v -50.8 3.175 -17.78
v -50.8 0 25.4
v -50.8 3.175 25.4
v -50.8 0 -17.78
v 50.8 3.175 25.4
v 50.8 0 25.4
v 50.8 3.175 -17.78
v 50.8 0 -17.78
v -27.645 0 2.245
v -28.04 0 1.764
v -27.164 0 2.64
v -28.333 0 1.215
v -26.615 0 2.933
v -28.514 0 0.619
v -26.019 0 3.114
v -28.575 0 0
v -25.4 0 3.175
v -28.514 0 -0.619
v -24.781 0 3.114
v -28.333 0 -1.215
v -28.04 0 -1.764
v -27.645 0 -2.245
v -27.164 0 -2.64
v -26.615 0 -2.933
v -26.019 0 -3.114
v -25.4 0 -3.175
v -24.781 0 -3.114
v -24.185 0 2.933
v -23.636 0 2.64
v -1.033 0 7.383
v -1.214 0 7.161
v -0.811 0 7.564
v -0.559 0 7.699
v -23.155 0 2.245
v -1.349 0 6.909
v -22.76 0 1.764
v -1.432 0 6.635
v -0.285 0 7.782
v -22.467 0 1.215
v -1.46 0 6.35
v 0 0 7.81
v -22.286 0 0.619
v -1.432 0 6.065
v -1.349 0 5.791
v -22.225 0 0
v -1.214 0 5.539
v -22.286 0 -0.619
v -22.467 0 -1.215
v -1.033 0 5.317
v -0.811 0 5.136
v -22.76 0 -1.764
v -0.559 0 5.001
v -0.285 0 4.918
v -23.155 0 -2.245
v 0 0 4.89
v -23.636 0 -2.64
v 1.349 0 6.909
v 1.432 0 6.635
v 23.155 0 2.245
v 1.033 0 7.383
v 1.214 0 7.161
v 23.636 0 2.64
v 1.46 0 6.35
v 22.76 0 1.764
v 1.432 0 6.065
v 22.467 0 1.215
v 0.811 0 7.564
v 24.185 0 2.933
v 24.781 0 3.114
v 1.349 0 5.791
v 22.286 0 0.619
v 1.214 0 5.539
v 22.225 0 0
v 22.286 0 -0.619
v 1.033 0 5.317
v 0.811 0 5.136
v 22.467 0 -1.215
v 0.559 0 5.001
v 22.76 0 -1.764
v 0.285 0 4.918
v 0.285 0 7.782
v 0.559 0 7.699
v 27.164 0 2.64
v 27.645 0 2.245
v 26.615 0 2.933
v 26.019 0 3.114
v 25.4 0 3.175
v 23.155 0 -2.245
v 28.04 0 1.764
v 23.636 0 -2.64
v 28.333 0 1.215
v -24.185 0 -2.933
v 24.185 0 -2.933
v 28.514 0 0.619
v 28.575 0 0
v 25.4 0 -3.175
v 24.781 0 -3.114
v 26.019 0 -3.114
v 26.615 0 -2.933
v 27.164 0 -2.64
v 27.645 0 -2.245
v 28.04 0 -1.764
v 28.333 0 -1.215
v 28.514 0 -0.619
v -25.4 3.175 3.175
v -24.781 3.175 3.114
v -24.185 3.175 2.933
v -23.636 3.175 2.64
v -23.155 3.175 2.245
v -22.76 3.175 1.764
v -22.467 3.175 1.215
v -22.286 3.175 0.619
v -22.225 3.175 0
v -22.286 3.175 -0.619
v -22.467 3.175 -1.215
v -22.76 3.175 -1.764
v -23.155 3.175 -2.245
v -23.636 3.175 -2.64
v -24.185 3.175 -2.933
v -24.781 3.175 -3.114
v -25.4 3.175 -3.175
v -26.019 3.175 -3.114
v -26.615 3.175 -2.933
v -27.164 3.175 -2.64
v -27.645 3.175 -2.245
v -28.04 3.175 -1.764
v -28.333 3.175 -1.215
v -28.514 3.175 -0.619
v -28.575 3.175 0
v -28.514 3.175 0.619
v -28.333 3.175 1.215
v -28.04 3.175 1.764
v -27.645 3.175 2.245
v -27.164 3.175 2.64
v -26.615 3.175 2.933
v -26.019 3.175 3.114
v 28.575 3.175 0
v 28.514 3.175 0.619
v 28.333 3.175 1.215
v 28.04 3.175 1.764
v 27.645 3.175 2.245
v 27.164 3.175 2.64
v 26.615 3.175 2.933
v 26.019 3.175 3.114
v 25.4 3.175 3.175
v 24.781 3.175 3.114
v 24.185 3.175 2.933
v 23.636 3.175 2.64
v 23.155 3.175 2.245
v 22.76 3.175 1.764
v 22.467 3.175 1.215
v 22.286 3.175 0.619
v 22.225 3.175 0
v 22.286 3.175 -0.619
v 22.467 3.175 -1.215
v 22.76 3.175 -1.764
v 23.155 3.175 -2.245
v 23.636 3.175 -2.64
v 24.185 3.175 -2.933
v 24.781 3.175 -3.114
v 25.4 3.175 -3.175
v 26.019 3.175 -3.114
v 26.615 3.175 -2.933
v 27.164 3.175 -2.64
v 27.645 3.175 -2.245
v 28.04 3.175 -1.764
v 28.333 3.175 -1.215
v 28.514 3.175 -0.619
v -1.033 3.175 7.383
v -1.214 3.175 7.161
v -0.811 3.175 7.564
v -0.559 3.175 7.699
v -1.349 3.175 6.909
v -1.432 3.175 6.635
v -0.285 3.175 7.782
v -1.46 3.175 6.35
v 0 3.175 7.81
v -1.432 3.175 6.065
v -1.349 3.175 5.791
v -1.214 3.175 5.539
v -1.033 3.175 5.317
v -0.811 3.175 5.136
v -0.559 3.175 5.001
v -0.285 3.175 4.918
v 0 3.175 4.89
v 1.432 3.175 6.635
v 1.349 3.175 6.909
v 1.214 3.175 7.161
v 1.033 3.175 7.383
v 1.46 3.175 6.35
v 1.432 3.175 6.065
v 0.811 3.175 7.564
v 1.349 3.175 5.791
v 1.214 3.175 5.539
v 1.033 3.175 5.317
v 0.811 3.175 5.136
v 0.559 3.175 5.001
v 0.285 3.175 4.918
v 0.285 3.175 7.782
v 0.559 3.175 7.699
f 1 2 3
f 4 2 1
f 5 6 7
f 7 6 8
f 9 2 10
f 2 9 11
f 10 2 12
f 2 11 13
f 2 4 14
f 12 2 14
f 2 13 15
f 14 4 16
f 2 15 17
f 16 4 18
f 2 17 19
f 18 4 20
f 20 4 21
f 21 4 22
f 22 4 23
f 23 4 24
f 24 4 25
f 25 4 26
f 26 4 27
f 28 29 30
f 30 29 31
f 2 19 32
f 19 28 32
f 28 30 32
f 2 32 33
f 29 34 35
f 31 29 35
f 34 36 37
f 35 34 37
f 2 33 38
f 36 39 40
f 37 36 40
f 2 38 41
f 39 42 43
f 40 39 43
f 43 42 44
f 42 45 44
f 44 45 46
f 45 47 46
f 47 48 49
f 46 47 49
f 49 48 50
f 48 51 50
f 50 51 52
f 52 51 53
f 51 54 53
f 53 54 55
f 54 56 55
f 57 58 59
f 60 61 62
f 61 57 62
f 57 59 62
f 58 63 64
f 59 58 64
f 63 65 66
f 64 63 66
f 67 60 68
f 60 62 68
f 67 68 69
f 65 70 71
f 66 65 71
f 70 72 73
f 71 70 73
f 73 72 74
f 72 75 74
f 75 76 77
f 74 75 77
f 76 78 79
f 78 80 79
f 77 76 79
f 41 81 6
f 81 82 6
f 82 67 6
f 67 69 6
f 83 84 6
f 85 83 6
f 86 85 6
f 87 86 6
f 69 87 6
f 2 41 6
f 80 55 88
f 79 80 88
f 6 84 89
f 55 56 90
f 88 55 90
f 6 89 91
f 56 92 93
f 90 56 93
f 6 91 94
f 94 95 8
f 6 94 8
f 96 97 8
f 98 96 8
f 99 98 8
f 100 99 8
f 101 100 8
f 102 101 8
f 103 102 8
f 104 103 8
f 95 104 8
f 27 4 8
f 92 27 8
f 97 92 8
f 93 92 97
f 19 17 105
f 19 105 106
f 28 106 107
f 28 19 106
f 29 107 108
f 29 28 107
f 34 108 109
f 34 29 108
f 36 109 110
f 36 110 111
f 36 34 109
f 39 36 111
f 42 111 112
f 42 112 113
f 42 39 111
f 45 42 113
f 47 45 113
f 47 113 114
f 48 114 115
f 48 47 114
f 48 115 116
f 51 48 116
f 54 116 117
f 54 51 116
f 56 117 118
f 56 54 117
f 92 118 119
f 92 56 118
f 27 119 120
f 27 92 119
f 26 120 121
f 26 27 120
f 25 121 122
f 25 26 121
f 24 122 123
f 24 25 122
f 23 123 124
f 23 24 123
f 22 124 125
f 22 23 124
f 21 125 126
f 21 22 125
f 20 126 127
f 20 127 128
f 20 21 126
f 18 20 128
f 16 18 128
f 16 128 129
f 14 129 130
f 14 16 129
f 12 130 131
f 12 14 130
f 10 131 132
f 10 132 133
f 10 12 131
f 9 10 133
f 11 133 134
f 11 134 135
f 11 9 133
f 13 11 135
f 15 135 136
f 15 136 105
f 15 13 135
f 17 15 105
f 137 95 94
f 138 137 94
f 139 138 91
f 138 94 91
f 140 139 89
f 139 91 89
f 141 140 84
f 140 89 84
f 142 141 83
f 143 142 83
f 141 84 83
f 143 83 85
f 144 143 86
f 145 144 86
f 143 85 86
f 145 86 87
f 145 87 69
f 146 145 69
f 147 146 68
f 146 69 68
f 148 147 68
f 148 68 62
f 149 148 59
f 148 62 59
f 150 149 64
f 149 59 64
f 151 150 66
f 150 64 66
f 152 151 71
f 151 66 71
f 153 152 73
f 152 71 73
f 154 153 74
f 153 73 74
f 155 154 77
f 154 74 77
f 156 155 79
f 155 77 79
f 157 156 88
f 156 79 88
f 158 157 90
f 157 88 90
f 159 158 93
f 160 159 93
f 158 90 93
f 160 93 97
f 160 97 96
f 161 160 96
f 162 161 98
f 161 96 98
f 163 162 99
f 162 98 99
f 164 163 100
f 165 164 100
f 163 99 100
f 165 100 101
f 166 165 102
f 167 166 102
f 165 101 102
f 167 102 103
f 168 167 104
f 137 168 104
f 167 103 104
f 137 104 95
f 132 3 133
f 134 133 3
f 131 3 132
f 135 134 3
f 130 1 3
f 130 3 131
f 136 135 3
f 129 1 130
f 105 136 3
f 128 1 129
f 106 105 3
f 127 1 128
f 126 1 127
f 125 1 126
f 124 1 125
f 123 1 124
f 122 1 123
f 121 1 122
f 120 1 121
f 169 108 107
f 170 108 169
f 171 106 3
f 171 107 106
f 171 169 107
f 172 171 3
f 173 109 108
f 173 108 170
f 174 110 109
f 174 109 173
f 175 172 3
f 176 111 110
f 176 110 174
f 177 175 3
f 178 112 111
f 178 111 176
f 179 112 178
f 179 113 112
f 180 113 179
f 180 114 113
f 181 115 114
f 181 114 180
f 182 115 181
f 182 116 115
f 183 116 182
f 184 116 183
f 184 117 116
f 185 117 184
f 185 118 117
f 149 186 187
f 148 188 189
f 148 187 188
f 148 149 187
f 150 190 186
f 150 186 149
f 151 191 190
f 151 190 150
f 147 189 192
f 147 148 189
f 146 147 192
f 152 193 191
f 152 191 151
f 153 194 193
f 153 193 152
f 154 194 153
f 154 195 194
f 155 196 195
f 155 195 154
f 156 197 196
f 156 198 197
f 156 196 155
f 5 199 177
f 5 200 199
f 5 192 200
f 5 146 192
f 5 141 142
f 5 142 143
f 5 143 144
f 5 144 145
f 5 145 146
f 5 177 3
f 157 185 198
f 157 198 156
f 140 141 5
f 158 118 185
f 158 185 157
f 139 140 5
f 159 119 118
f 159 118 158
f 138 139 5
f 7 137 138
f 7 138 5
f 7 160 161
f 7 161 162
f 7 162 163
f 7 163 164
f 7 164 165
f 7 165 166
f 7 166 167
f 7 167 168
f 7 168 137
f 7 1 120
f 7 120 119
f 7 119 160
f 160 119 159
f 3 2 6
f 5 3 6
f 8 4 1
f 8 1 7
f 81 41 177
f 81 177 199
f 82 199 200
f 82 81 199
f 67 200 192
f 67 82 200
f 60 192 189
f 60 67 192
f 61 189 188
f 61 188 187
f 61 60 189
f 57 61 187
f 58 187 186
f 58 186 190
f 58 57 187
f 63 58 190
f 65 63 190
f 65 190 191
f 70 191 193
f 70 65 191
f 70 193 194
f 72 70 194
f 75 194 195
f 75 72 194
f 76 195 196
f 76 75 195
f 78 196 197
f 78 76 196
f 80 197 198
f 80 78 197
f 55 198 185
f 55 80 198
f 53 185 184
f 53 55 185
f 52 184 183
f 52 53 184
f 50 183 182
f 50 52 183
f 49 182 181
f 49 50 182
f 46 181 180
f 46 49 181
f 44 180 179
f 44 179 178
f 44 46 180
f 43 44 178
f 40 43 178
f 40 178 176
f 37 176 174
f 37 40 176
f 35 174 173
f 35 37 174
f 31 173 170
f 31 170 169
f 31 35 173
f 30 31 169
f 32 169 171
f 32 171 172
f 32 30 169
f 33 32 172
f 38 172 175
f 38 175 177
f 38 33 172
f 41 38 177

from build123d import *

# Parameters (mm, degrees)
SKETCH2_W           = 101.6
SKETCH2_H           = 43.18
SKETCH2_R           = 1.4605
SKETCH2_R_2         = 3.175
BOSS_EXTRUDE1_DEPTH = 3.175


with BuildPart() as part:
    # Sketch2 → Boss-Extrude1 (new body)
    with BuildSketch(Plane(origin=(0, 0, 0), x_dir=(1, 0, 0), z_dir=(0, 1, 0))):
        with Locations((0, -3.81)):
            Rectangle(SKETCH2_W, SKETCH2_H)
        with Locations(Location((0, -6.35, 0), (0, 0, 270))):
            Circle(SKETCH2_R, mode=Mode.SUBTRACT)
        with Locations(Location((-25.4, 0, 0), (0, 0, 270))):
            Circle(SKETCH2_R_2, mode=Mode.SUBTRACT)
        with BuildLine():
            ThreePointArc((22.225, 0), (25.4, 3.175), (28.575, 0))
            ThreePointArc((28.575, 0), (25.4, -3.175), (22.225, 0))
        make_face(mode=Mode.SUBTRACT)
    extrude(amount=BOSS_EXTRUDE1_DEPTH)


solid = part.part
